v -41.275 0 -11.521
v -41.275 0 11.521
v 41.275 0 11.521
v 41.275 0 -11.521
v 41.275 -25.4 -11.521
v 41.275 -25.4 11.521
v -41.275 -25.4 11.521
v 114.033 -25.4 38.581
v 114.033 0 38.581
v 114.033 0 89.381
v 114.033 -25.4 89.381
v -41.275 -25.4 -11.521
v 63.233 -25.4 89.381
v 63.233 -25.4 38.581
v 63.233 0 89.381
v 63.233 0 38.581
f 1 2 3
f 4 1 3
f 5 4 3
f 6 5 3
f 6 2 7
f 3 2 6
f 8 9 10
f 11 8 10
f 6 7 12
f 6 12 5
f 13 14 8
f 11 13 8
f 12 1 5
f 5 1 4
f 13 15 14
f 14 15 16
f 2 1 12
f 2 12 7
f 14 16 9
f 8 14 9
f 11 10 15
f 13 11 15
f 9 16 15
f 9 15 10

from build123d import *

# Parameters (mm, degrees)
F0_W     = 82.55
F0_H     = 23.04143
F1_DEPTH = 25.4


with BuildPart() as f1:
    # F0 (on Front) → F1 (new body)
    with BuildSketch(Plane.XZ):
        Polygon((63.232685, 89.38066), (63.232685, 46.714649), (63.232685, 38.58066), (114.032685, 38.58066), (114.032685, 89.38066), align=None)
        Rectangle(F0_W, F0_H)
    extrude(amount=F1_DEPTH)


solid = f1.part
